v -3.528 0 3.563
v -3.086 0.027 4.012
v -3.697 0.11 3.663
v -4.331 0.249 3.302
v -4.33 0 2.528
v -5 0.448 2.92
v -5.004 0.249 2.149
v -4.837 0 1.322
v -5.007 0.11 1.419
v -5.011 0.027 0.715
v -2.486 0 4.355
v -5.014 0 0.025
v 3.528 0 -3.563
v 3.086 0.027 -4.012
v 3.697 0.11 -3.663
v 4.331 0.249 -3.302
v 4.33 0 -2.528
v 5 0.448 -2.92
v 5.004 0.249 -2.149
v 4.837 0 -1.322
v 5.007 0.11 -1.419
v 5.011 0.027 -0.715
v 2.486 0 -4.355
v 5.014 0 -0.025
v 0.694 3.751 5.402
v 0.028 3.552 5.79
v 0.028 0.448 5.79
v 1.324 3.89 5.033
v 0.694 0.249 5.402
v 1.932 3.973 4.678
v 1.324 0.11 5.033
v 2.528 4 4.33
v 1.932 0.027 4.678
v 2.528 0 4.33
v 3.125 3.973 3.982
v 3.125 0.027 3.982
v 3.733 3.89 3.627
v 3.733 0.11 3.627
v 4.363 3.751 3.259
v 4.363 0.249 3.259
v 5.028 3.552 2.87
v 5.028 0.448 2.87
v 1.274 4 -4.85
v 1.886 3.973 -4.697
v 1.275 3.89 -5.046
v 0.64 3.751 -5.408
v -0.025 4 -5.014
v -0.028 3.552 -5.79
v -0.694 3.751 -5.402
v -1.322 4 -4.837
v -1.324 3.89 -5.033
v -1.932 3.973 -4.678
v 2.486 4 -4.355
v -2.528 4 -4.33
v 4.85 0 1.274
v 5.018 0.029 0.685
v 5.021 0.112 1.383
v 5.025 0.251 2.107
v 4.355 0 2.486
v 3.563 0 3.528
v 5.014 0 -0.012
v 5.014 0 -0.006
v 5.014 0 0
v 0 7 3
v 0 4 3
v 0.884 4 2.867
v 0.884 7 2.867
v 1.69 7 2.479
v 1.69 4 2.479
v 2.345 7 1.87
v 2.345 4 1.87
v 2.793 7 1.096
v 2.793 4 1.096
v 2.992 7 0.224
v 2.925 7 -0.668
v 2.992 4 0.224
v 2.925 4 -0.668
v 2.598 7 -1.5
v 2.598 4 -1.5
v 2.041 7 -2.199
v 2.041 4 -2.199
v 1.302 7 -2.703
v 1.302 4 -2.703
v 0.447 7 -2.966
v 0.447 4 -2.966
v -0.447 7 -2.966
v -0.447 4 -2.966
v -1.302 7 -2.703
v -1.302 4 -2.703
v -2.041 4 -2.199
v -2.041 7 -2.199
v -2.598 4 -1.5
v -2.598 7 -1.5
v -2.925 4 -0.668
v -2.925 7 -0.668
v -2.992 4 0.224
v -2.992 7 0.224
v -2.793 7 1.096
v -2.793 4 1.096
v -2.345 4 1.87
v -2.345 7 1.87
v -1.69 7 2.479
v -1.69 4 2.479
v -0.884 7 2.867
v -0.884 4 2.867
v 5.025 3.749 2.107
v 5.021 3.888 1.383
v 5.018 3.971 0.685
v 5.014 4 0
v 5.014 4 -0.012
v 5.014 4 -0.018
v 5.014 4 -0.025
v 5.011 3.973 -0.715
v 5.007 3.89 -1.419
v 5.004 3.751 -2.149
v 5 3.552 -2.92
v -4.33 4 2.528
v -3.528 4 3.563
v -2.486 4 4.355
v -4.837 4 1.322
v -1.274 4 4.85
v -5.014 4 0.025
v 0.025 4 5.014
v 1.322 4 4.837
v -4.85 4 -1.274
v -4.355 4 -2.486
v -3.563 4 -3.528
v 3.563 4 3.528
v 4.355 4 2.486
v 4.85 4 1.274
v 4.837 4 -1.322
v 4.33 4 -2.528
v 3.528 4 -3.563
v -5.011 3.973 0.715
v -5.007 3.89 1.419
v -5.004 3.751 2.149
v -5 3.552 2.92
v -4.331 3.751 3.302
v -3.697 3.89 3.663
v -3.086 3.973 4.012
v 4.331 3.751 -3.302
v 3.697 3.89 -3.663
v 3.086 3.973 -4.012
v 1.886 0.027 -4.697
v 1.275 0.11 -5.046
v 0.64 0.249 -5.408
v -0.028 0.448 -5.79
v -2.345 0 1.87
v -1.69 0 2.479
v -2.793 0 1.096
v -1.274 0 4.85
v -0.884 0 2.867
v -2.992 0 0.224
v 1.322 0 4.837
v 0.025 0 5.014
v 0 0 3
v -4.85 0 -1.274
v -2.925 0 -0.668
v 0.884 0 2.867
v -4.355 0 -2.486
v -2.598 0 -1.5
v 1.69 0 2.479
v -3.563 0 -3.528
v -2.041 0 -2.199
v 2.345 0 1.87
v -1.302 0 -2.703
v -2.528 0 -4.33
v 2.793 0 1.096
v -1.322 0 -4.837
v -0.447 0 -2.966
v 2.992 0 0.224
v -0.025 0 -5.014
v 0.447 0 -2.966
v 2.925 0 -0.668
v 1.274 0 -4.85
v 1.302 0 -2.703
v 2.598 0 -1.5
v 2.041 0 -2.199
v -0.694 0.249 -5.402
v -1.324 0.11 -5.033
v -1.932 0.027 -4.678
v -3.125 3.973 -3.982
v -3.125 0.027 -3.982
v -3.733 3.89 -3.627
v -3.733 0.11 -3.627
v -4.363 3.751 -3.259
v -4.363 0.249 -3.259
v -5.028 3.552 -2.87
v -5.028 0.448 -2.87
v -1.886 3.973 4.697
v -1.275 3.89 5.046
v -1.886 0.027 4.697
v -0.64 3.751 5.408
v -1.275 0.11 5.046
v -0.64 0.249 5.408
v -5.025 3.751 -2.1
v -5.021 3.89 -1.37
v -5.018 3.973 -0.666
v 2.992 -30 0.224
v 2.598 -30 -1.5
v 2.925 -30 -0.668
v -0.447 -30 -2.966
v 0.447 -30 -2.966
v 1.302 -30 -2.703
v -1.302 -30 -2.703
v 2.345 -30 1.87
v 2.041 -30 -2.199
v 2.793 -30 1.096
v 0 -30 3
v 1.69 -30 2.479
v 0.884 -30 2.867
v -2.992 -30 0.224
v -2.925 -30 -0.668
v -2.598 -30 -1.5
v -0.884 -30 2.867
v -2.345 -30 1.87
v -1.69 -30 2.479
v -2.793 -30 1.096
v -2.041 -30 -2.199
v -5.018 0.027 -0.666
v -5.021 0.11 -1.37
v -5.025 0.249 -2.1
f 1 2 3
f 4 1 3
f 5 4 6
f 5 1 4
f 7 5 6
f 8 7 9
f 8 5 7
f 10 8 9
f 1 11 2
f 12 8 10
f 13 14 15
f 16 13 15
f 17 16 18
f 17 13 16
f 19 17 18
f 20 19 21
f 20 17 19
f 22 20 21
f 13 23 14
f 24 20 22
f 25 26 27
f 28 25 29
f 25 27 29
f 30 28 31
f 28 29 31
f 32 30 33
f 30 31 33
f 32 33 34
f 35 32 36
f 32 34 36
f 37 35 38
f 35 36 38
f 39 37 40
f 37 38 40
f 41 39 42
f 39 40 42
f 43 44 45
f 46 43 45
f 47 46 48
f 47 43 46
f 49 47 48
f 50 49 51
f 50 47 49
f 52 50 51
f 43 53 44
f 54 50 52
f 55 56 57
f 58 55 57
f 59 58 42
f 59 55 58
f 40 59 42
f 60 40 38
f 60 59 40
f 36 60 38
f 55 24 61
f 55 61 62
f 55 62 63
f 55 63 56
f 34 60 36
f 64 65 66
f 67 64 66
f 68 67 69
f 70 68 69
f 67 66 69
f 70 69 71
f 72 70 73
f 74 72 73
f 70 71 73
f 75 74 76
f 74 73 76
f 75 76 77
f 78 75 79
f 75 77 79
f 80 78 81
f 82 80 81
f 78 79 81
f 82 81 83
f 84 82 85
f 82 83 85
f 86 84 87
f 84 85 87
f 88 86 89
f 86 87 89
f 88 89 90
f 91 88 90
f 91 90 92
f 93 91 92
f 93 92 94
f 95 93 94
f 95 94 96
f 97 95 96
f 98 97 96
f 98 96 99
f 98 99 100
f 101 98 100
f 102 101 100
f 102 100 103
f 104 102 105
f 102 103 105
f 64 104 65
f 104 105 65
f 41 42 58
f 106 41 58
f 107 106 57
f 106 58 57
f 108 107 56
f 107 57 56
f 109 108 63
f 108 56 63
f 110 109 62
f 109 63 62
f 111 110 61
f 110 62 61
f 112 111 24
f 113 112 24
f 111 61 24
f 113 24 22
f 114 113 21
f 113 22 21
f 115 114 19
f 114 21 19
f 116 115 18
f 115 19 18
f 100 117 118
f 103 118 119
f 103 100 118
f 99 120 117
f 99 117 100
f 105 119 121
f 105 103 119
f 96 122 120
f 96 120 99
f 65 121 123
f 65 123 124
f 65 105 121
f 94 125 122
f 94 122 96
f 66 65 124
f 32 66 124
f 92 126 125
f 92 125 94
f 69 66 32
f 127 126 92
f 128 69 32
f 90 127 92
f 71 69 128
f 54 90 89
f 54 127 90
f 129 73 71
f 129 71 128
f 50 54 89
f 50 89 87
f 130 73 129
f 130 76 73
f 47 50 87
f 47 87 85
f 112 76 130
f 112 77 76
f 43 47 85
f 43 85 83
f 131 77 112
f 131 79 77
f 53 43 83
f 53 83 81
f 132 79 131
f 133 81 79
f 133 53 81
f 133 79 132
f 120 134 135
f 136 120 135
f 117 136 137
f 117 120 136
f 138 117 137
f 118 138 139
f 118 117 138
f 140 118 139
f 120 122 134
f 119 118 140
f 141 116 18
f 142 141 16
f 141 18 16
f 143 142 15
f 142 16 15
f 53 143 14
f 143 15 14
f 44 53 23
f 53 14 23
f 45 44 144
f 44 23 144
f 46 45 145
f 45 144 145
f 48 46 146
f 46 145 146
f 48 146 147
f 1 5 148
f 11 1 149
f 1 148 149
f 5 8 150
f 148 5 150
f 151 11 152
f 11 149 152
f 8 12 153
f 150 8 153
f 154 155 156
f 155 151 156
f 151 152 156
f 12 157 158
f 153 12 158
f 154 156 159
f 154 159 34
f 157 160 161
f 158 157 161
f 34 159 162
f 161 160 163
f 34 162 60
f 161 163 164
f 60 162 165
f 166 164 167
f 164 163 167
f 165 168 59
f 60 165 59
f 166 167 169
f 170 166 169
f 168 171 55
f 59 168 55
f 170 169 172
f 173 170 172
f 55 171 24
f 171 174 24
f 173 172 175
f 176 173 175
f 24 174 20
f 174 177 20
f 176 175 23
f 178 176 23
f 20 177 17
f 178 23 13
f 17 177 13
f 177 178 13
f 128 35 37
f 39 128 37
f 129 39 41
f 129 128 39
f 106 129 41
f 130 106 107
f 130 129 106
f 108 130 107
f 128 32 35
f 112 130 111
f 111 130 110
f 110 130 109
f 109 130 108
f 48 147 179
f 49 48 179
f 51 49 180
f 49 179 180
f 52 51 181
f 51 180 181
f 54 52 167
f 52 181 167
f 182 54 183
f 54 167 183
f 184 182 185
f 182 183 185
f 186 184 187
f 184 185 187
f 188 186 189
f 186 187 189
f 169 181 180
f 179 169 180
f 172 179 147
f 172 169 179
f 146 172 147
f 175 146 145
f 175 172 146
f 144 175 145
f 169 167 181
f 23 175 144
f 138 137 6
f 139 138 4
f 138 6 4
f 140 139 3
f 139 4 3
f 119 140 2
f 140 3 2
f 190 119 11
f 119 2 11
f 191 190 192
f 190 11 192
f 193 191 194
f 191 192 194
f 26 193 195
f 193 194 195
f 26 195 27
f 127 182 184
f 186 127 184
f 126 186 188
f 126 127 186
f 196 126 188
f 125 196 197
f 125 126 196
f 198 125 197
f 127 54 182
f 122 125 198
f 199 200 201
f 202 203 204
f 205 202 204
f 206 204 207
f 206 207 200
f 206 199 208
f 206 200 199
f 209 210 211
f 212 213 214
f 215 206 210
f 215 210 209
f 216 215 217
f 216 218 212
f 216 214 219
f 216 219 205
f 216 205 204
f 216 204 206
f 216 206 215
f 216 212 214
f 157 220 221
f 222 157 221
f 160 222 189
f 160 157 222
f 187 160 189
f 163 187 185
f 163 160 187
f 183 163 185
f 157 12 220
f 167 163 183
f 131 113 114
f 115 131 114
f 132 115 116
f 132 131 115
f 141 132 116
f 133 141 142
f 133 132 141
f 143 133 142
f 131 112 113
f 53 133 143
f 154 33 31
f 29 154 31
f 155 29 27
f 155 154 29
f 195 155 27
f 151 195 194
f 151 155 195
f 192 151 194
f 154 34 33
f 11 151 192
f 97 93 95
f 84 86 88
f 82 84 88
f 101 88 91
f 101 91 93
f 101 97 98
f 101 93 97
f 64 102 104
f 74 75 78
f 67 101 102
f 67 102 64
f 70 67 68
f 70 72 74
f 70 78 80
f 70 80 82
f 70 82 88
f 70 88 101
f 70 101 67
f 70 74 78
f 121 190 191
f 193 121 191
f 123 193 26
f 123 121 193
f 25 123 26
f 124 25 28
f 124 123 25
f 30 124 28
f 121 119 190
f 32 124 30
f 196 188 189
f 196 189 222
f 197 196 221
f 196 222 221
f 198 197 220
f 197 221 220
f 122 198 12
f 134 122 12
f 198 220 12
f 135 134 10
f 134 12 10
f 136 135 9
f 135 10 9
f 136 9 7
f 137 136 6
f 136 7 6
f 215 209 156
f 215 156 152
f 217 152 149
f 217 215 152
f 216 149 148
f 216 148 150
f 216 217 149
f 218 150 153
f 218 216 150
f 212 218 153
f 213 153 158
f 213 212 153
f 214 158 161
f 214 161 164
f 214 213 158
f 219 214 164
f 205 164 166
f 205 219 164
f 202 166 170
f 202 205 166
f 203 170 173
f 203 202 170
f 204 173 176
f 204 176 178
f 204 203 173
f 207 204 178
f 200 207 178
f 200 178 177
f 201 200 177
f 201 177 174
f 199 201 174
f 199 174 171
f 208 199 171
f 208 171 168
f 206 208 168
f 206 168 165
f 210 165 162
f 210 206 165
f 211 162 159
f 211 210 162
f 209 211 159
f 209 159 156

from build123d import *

# Parameters (mm, degrees)
BOSS_EXTRUDE1_DEPTH = 4
SKETCH2_OUTSIDE_W   = 29.082
SKETCH2_OUTSIDE_H   = 30.606
SKETCH2_OUTSIDE_R   = 5.014305997
CUT_EXTRUDE1_DEPTH  = 4
CUT_EXTRUDE1_DRAFT  = -60
SKETCH3_OUTSIDE_W   = 29.082
SKETCH3_OUTSIDE_H   = 30.606
SKETCH3_OUTSIDE_R   = 5.014305997
CUT_EXTRUDE2_DEPTH  = 4
CUT_EXTRUDE2_DRAFT  = -60
SKETCH4_R           = 3
BOSS_EXTRUDE3_DEPTH = 3
BOSS_EXTRUDE4_START = 30
SKETCH5_R           = 3
BOSS_EXTRUDE4_DEPTH = 30


with BuildPart() as part:
    # Sketch1 → Boss-Extrude1 (new body)
    with BuildSketch(Plane(origin=(0, 0, 0), x_dir=(1, 0, 0), z_dir=(0, 1, 0))):
        Polygon((5, 2.919649438), (-0.028490583, 5.789951738), (-5.028490583, 2.8703023), (-5, -2.919649438), (0.028490583, -5.789951738), (5.028490583, -2.8703023), align=None)
    extrude(amount=BOSS_EXTRUDE1_DEPTH)


with BuildPart() as cut_extrude1_tool:
    # Sketch2 outside → Cut-Extrude1 (with draft: the straight prism first)
    with BuildSketch(Plane(origin=(0, 4, 0), x_dir=(1, 0, 0), z_dir=(0, 1, 0))):
        Rectangle(SKETCH2_OUTSIDE_W, SKETCH2_OUTSIDE_H)
        Circle(SKETCH2_OUTSIDE_R, mode=Mode.SUBTRACT)
    extrude(amount=-CUT_EXTRUDE1_DEPTH)
    # Cut-Extrude1: the draft: its side faces are tilted about the plane it starts from
    cut_extrude1_sides = [cut_extrude1_tool.faces().sort_by_distance(p)[0] for p in [
        (0, 2, 15.303),
        (14.541, 2, 0),
        (0, 2, -15.303),
        (-14.541, 2, 0),
        (-5.014305997, 2, 0),
    ]]
    draft(cut_extrude1_sides, Plane(origin=(0, 4, 0), x_dir=(1, 0, 0), z_dir=(0, 1, 0)), CUT_EXTRUDE1_DRAFT)


with BuildPart() as part_1:
    add(part.part)

    # Cut-Extrude1: cut by cut_extrude1_tool
    add(cut_extrude1_tool.part, mode=Mode.SUBTRACT)


with BuildPart() as cut_extrude2_tool:
    # Sketch3 outside → Cut-Extrude2 (with draft: the straight prism first)
    with BuildSketch(Plane.XZ):
        Rectangle(SKETCH3_OUTSIDE_W, SKETCH3_OUTSIDE_H)
        Circle(SKETCH3_OUTSIDE_R, mode=Mode.SUBTRACT)
    extrude(amount=-CUT_EXTRUDE2_DEPTH)
    # Cut-Extrude2: the draft: its side faces are tilted about the plane it starts from
    cut_extrude2_sides = [cut_extrude2_tool.faces().sort_by_distance(p)[0] for p in [
        (0, 2, -15.303),
        (14.541, 2, 0),
        (0, 2, 15.303),
        (-14.541, 2, 0),
        (-5.014305997, 2, 0),
    ]]
    draft(cut_extrude2_sides, Plane.XZ, CUT_EXTRUDE2_DRAFT)


with BuildPart() as part_2:
    add(part_1.part)

    # Cut-Extrude2: cut by cut_extrude2_tool
    add(cut_extrude2_tool.part, mode=Mode.SUBTRACT)

    # Sketch4 → Boss-Extrude3 (add)
    with BuildSketch(Plane(origin=(0, 4, 0), x_dir=(1, 0, 0), z_dir=(0, 1, 0))):
        with Locations(Location((0, 0, 0), (0, 0, 270))):
            Circle(SKETCH4_R)
    extrude(amount=BOSS_EXTRUDE3_DEPTH)

    # Sketch5 → Boss-Extrude4 (add)
    with BuildSketch(Plane.XZ.offset(BOSS_EXTRUDE4_START)):
        with Locations(Location((0, 0, 0), (0, 0, 90))):
            Circle(SKETCH5_R)
    extrude(amount=-BOSS_EXTRUDE4_DEPTH)


solid = part_2.part
